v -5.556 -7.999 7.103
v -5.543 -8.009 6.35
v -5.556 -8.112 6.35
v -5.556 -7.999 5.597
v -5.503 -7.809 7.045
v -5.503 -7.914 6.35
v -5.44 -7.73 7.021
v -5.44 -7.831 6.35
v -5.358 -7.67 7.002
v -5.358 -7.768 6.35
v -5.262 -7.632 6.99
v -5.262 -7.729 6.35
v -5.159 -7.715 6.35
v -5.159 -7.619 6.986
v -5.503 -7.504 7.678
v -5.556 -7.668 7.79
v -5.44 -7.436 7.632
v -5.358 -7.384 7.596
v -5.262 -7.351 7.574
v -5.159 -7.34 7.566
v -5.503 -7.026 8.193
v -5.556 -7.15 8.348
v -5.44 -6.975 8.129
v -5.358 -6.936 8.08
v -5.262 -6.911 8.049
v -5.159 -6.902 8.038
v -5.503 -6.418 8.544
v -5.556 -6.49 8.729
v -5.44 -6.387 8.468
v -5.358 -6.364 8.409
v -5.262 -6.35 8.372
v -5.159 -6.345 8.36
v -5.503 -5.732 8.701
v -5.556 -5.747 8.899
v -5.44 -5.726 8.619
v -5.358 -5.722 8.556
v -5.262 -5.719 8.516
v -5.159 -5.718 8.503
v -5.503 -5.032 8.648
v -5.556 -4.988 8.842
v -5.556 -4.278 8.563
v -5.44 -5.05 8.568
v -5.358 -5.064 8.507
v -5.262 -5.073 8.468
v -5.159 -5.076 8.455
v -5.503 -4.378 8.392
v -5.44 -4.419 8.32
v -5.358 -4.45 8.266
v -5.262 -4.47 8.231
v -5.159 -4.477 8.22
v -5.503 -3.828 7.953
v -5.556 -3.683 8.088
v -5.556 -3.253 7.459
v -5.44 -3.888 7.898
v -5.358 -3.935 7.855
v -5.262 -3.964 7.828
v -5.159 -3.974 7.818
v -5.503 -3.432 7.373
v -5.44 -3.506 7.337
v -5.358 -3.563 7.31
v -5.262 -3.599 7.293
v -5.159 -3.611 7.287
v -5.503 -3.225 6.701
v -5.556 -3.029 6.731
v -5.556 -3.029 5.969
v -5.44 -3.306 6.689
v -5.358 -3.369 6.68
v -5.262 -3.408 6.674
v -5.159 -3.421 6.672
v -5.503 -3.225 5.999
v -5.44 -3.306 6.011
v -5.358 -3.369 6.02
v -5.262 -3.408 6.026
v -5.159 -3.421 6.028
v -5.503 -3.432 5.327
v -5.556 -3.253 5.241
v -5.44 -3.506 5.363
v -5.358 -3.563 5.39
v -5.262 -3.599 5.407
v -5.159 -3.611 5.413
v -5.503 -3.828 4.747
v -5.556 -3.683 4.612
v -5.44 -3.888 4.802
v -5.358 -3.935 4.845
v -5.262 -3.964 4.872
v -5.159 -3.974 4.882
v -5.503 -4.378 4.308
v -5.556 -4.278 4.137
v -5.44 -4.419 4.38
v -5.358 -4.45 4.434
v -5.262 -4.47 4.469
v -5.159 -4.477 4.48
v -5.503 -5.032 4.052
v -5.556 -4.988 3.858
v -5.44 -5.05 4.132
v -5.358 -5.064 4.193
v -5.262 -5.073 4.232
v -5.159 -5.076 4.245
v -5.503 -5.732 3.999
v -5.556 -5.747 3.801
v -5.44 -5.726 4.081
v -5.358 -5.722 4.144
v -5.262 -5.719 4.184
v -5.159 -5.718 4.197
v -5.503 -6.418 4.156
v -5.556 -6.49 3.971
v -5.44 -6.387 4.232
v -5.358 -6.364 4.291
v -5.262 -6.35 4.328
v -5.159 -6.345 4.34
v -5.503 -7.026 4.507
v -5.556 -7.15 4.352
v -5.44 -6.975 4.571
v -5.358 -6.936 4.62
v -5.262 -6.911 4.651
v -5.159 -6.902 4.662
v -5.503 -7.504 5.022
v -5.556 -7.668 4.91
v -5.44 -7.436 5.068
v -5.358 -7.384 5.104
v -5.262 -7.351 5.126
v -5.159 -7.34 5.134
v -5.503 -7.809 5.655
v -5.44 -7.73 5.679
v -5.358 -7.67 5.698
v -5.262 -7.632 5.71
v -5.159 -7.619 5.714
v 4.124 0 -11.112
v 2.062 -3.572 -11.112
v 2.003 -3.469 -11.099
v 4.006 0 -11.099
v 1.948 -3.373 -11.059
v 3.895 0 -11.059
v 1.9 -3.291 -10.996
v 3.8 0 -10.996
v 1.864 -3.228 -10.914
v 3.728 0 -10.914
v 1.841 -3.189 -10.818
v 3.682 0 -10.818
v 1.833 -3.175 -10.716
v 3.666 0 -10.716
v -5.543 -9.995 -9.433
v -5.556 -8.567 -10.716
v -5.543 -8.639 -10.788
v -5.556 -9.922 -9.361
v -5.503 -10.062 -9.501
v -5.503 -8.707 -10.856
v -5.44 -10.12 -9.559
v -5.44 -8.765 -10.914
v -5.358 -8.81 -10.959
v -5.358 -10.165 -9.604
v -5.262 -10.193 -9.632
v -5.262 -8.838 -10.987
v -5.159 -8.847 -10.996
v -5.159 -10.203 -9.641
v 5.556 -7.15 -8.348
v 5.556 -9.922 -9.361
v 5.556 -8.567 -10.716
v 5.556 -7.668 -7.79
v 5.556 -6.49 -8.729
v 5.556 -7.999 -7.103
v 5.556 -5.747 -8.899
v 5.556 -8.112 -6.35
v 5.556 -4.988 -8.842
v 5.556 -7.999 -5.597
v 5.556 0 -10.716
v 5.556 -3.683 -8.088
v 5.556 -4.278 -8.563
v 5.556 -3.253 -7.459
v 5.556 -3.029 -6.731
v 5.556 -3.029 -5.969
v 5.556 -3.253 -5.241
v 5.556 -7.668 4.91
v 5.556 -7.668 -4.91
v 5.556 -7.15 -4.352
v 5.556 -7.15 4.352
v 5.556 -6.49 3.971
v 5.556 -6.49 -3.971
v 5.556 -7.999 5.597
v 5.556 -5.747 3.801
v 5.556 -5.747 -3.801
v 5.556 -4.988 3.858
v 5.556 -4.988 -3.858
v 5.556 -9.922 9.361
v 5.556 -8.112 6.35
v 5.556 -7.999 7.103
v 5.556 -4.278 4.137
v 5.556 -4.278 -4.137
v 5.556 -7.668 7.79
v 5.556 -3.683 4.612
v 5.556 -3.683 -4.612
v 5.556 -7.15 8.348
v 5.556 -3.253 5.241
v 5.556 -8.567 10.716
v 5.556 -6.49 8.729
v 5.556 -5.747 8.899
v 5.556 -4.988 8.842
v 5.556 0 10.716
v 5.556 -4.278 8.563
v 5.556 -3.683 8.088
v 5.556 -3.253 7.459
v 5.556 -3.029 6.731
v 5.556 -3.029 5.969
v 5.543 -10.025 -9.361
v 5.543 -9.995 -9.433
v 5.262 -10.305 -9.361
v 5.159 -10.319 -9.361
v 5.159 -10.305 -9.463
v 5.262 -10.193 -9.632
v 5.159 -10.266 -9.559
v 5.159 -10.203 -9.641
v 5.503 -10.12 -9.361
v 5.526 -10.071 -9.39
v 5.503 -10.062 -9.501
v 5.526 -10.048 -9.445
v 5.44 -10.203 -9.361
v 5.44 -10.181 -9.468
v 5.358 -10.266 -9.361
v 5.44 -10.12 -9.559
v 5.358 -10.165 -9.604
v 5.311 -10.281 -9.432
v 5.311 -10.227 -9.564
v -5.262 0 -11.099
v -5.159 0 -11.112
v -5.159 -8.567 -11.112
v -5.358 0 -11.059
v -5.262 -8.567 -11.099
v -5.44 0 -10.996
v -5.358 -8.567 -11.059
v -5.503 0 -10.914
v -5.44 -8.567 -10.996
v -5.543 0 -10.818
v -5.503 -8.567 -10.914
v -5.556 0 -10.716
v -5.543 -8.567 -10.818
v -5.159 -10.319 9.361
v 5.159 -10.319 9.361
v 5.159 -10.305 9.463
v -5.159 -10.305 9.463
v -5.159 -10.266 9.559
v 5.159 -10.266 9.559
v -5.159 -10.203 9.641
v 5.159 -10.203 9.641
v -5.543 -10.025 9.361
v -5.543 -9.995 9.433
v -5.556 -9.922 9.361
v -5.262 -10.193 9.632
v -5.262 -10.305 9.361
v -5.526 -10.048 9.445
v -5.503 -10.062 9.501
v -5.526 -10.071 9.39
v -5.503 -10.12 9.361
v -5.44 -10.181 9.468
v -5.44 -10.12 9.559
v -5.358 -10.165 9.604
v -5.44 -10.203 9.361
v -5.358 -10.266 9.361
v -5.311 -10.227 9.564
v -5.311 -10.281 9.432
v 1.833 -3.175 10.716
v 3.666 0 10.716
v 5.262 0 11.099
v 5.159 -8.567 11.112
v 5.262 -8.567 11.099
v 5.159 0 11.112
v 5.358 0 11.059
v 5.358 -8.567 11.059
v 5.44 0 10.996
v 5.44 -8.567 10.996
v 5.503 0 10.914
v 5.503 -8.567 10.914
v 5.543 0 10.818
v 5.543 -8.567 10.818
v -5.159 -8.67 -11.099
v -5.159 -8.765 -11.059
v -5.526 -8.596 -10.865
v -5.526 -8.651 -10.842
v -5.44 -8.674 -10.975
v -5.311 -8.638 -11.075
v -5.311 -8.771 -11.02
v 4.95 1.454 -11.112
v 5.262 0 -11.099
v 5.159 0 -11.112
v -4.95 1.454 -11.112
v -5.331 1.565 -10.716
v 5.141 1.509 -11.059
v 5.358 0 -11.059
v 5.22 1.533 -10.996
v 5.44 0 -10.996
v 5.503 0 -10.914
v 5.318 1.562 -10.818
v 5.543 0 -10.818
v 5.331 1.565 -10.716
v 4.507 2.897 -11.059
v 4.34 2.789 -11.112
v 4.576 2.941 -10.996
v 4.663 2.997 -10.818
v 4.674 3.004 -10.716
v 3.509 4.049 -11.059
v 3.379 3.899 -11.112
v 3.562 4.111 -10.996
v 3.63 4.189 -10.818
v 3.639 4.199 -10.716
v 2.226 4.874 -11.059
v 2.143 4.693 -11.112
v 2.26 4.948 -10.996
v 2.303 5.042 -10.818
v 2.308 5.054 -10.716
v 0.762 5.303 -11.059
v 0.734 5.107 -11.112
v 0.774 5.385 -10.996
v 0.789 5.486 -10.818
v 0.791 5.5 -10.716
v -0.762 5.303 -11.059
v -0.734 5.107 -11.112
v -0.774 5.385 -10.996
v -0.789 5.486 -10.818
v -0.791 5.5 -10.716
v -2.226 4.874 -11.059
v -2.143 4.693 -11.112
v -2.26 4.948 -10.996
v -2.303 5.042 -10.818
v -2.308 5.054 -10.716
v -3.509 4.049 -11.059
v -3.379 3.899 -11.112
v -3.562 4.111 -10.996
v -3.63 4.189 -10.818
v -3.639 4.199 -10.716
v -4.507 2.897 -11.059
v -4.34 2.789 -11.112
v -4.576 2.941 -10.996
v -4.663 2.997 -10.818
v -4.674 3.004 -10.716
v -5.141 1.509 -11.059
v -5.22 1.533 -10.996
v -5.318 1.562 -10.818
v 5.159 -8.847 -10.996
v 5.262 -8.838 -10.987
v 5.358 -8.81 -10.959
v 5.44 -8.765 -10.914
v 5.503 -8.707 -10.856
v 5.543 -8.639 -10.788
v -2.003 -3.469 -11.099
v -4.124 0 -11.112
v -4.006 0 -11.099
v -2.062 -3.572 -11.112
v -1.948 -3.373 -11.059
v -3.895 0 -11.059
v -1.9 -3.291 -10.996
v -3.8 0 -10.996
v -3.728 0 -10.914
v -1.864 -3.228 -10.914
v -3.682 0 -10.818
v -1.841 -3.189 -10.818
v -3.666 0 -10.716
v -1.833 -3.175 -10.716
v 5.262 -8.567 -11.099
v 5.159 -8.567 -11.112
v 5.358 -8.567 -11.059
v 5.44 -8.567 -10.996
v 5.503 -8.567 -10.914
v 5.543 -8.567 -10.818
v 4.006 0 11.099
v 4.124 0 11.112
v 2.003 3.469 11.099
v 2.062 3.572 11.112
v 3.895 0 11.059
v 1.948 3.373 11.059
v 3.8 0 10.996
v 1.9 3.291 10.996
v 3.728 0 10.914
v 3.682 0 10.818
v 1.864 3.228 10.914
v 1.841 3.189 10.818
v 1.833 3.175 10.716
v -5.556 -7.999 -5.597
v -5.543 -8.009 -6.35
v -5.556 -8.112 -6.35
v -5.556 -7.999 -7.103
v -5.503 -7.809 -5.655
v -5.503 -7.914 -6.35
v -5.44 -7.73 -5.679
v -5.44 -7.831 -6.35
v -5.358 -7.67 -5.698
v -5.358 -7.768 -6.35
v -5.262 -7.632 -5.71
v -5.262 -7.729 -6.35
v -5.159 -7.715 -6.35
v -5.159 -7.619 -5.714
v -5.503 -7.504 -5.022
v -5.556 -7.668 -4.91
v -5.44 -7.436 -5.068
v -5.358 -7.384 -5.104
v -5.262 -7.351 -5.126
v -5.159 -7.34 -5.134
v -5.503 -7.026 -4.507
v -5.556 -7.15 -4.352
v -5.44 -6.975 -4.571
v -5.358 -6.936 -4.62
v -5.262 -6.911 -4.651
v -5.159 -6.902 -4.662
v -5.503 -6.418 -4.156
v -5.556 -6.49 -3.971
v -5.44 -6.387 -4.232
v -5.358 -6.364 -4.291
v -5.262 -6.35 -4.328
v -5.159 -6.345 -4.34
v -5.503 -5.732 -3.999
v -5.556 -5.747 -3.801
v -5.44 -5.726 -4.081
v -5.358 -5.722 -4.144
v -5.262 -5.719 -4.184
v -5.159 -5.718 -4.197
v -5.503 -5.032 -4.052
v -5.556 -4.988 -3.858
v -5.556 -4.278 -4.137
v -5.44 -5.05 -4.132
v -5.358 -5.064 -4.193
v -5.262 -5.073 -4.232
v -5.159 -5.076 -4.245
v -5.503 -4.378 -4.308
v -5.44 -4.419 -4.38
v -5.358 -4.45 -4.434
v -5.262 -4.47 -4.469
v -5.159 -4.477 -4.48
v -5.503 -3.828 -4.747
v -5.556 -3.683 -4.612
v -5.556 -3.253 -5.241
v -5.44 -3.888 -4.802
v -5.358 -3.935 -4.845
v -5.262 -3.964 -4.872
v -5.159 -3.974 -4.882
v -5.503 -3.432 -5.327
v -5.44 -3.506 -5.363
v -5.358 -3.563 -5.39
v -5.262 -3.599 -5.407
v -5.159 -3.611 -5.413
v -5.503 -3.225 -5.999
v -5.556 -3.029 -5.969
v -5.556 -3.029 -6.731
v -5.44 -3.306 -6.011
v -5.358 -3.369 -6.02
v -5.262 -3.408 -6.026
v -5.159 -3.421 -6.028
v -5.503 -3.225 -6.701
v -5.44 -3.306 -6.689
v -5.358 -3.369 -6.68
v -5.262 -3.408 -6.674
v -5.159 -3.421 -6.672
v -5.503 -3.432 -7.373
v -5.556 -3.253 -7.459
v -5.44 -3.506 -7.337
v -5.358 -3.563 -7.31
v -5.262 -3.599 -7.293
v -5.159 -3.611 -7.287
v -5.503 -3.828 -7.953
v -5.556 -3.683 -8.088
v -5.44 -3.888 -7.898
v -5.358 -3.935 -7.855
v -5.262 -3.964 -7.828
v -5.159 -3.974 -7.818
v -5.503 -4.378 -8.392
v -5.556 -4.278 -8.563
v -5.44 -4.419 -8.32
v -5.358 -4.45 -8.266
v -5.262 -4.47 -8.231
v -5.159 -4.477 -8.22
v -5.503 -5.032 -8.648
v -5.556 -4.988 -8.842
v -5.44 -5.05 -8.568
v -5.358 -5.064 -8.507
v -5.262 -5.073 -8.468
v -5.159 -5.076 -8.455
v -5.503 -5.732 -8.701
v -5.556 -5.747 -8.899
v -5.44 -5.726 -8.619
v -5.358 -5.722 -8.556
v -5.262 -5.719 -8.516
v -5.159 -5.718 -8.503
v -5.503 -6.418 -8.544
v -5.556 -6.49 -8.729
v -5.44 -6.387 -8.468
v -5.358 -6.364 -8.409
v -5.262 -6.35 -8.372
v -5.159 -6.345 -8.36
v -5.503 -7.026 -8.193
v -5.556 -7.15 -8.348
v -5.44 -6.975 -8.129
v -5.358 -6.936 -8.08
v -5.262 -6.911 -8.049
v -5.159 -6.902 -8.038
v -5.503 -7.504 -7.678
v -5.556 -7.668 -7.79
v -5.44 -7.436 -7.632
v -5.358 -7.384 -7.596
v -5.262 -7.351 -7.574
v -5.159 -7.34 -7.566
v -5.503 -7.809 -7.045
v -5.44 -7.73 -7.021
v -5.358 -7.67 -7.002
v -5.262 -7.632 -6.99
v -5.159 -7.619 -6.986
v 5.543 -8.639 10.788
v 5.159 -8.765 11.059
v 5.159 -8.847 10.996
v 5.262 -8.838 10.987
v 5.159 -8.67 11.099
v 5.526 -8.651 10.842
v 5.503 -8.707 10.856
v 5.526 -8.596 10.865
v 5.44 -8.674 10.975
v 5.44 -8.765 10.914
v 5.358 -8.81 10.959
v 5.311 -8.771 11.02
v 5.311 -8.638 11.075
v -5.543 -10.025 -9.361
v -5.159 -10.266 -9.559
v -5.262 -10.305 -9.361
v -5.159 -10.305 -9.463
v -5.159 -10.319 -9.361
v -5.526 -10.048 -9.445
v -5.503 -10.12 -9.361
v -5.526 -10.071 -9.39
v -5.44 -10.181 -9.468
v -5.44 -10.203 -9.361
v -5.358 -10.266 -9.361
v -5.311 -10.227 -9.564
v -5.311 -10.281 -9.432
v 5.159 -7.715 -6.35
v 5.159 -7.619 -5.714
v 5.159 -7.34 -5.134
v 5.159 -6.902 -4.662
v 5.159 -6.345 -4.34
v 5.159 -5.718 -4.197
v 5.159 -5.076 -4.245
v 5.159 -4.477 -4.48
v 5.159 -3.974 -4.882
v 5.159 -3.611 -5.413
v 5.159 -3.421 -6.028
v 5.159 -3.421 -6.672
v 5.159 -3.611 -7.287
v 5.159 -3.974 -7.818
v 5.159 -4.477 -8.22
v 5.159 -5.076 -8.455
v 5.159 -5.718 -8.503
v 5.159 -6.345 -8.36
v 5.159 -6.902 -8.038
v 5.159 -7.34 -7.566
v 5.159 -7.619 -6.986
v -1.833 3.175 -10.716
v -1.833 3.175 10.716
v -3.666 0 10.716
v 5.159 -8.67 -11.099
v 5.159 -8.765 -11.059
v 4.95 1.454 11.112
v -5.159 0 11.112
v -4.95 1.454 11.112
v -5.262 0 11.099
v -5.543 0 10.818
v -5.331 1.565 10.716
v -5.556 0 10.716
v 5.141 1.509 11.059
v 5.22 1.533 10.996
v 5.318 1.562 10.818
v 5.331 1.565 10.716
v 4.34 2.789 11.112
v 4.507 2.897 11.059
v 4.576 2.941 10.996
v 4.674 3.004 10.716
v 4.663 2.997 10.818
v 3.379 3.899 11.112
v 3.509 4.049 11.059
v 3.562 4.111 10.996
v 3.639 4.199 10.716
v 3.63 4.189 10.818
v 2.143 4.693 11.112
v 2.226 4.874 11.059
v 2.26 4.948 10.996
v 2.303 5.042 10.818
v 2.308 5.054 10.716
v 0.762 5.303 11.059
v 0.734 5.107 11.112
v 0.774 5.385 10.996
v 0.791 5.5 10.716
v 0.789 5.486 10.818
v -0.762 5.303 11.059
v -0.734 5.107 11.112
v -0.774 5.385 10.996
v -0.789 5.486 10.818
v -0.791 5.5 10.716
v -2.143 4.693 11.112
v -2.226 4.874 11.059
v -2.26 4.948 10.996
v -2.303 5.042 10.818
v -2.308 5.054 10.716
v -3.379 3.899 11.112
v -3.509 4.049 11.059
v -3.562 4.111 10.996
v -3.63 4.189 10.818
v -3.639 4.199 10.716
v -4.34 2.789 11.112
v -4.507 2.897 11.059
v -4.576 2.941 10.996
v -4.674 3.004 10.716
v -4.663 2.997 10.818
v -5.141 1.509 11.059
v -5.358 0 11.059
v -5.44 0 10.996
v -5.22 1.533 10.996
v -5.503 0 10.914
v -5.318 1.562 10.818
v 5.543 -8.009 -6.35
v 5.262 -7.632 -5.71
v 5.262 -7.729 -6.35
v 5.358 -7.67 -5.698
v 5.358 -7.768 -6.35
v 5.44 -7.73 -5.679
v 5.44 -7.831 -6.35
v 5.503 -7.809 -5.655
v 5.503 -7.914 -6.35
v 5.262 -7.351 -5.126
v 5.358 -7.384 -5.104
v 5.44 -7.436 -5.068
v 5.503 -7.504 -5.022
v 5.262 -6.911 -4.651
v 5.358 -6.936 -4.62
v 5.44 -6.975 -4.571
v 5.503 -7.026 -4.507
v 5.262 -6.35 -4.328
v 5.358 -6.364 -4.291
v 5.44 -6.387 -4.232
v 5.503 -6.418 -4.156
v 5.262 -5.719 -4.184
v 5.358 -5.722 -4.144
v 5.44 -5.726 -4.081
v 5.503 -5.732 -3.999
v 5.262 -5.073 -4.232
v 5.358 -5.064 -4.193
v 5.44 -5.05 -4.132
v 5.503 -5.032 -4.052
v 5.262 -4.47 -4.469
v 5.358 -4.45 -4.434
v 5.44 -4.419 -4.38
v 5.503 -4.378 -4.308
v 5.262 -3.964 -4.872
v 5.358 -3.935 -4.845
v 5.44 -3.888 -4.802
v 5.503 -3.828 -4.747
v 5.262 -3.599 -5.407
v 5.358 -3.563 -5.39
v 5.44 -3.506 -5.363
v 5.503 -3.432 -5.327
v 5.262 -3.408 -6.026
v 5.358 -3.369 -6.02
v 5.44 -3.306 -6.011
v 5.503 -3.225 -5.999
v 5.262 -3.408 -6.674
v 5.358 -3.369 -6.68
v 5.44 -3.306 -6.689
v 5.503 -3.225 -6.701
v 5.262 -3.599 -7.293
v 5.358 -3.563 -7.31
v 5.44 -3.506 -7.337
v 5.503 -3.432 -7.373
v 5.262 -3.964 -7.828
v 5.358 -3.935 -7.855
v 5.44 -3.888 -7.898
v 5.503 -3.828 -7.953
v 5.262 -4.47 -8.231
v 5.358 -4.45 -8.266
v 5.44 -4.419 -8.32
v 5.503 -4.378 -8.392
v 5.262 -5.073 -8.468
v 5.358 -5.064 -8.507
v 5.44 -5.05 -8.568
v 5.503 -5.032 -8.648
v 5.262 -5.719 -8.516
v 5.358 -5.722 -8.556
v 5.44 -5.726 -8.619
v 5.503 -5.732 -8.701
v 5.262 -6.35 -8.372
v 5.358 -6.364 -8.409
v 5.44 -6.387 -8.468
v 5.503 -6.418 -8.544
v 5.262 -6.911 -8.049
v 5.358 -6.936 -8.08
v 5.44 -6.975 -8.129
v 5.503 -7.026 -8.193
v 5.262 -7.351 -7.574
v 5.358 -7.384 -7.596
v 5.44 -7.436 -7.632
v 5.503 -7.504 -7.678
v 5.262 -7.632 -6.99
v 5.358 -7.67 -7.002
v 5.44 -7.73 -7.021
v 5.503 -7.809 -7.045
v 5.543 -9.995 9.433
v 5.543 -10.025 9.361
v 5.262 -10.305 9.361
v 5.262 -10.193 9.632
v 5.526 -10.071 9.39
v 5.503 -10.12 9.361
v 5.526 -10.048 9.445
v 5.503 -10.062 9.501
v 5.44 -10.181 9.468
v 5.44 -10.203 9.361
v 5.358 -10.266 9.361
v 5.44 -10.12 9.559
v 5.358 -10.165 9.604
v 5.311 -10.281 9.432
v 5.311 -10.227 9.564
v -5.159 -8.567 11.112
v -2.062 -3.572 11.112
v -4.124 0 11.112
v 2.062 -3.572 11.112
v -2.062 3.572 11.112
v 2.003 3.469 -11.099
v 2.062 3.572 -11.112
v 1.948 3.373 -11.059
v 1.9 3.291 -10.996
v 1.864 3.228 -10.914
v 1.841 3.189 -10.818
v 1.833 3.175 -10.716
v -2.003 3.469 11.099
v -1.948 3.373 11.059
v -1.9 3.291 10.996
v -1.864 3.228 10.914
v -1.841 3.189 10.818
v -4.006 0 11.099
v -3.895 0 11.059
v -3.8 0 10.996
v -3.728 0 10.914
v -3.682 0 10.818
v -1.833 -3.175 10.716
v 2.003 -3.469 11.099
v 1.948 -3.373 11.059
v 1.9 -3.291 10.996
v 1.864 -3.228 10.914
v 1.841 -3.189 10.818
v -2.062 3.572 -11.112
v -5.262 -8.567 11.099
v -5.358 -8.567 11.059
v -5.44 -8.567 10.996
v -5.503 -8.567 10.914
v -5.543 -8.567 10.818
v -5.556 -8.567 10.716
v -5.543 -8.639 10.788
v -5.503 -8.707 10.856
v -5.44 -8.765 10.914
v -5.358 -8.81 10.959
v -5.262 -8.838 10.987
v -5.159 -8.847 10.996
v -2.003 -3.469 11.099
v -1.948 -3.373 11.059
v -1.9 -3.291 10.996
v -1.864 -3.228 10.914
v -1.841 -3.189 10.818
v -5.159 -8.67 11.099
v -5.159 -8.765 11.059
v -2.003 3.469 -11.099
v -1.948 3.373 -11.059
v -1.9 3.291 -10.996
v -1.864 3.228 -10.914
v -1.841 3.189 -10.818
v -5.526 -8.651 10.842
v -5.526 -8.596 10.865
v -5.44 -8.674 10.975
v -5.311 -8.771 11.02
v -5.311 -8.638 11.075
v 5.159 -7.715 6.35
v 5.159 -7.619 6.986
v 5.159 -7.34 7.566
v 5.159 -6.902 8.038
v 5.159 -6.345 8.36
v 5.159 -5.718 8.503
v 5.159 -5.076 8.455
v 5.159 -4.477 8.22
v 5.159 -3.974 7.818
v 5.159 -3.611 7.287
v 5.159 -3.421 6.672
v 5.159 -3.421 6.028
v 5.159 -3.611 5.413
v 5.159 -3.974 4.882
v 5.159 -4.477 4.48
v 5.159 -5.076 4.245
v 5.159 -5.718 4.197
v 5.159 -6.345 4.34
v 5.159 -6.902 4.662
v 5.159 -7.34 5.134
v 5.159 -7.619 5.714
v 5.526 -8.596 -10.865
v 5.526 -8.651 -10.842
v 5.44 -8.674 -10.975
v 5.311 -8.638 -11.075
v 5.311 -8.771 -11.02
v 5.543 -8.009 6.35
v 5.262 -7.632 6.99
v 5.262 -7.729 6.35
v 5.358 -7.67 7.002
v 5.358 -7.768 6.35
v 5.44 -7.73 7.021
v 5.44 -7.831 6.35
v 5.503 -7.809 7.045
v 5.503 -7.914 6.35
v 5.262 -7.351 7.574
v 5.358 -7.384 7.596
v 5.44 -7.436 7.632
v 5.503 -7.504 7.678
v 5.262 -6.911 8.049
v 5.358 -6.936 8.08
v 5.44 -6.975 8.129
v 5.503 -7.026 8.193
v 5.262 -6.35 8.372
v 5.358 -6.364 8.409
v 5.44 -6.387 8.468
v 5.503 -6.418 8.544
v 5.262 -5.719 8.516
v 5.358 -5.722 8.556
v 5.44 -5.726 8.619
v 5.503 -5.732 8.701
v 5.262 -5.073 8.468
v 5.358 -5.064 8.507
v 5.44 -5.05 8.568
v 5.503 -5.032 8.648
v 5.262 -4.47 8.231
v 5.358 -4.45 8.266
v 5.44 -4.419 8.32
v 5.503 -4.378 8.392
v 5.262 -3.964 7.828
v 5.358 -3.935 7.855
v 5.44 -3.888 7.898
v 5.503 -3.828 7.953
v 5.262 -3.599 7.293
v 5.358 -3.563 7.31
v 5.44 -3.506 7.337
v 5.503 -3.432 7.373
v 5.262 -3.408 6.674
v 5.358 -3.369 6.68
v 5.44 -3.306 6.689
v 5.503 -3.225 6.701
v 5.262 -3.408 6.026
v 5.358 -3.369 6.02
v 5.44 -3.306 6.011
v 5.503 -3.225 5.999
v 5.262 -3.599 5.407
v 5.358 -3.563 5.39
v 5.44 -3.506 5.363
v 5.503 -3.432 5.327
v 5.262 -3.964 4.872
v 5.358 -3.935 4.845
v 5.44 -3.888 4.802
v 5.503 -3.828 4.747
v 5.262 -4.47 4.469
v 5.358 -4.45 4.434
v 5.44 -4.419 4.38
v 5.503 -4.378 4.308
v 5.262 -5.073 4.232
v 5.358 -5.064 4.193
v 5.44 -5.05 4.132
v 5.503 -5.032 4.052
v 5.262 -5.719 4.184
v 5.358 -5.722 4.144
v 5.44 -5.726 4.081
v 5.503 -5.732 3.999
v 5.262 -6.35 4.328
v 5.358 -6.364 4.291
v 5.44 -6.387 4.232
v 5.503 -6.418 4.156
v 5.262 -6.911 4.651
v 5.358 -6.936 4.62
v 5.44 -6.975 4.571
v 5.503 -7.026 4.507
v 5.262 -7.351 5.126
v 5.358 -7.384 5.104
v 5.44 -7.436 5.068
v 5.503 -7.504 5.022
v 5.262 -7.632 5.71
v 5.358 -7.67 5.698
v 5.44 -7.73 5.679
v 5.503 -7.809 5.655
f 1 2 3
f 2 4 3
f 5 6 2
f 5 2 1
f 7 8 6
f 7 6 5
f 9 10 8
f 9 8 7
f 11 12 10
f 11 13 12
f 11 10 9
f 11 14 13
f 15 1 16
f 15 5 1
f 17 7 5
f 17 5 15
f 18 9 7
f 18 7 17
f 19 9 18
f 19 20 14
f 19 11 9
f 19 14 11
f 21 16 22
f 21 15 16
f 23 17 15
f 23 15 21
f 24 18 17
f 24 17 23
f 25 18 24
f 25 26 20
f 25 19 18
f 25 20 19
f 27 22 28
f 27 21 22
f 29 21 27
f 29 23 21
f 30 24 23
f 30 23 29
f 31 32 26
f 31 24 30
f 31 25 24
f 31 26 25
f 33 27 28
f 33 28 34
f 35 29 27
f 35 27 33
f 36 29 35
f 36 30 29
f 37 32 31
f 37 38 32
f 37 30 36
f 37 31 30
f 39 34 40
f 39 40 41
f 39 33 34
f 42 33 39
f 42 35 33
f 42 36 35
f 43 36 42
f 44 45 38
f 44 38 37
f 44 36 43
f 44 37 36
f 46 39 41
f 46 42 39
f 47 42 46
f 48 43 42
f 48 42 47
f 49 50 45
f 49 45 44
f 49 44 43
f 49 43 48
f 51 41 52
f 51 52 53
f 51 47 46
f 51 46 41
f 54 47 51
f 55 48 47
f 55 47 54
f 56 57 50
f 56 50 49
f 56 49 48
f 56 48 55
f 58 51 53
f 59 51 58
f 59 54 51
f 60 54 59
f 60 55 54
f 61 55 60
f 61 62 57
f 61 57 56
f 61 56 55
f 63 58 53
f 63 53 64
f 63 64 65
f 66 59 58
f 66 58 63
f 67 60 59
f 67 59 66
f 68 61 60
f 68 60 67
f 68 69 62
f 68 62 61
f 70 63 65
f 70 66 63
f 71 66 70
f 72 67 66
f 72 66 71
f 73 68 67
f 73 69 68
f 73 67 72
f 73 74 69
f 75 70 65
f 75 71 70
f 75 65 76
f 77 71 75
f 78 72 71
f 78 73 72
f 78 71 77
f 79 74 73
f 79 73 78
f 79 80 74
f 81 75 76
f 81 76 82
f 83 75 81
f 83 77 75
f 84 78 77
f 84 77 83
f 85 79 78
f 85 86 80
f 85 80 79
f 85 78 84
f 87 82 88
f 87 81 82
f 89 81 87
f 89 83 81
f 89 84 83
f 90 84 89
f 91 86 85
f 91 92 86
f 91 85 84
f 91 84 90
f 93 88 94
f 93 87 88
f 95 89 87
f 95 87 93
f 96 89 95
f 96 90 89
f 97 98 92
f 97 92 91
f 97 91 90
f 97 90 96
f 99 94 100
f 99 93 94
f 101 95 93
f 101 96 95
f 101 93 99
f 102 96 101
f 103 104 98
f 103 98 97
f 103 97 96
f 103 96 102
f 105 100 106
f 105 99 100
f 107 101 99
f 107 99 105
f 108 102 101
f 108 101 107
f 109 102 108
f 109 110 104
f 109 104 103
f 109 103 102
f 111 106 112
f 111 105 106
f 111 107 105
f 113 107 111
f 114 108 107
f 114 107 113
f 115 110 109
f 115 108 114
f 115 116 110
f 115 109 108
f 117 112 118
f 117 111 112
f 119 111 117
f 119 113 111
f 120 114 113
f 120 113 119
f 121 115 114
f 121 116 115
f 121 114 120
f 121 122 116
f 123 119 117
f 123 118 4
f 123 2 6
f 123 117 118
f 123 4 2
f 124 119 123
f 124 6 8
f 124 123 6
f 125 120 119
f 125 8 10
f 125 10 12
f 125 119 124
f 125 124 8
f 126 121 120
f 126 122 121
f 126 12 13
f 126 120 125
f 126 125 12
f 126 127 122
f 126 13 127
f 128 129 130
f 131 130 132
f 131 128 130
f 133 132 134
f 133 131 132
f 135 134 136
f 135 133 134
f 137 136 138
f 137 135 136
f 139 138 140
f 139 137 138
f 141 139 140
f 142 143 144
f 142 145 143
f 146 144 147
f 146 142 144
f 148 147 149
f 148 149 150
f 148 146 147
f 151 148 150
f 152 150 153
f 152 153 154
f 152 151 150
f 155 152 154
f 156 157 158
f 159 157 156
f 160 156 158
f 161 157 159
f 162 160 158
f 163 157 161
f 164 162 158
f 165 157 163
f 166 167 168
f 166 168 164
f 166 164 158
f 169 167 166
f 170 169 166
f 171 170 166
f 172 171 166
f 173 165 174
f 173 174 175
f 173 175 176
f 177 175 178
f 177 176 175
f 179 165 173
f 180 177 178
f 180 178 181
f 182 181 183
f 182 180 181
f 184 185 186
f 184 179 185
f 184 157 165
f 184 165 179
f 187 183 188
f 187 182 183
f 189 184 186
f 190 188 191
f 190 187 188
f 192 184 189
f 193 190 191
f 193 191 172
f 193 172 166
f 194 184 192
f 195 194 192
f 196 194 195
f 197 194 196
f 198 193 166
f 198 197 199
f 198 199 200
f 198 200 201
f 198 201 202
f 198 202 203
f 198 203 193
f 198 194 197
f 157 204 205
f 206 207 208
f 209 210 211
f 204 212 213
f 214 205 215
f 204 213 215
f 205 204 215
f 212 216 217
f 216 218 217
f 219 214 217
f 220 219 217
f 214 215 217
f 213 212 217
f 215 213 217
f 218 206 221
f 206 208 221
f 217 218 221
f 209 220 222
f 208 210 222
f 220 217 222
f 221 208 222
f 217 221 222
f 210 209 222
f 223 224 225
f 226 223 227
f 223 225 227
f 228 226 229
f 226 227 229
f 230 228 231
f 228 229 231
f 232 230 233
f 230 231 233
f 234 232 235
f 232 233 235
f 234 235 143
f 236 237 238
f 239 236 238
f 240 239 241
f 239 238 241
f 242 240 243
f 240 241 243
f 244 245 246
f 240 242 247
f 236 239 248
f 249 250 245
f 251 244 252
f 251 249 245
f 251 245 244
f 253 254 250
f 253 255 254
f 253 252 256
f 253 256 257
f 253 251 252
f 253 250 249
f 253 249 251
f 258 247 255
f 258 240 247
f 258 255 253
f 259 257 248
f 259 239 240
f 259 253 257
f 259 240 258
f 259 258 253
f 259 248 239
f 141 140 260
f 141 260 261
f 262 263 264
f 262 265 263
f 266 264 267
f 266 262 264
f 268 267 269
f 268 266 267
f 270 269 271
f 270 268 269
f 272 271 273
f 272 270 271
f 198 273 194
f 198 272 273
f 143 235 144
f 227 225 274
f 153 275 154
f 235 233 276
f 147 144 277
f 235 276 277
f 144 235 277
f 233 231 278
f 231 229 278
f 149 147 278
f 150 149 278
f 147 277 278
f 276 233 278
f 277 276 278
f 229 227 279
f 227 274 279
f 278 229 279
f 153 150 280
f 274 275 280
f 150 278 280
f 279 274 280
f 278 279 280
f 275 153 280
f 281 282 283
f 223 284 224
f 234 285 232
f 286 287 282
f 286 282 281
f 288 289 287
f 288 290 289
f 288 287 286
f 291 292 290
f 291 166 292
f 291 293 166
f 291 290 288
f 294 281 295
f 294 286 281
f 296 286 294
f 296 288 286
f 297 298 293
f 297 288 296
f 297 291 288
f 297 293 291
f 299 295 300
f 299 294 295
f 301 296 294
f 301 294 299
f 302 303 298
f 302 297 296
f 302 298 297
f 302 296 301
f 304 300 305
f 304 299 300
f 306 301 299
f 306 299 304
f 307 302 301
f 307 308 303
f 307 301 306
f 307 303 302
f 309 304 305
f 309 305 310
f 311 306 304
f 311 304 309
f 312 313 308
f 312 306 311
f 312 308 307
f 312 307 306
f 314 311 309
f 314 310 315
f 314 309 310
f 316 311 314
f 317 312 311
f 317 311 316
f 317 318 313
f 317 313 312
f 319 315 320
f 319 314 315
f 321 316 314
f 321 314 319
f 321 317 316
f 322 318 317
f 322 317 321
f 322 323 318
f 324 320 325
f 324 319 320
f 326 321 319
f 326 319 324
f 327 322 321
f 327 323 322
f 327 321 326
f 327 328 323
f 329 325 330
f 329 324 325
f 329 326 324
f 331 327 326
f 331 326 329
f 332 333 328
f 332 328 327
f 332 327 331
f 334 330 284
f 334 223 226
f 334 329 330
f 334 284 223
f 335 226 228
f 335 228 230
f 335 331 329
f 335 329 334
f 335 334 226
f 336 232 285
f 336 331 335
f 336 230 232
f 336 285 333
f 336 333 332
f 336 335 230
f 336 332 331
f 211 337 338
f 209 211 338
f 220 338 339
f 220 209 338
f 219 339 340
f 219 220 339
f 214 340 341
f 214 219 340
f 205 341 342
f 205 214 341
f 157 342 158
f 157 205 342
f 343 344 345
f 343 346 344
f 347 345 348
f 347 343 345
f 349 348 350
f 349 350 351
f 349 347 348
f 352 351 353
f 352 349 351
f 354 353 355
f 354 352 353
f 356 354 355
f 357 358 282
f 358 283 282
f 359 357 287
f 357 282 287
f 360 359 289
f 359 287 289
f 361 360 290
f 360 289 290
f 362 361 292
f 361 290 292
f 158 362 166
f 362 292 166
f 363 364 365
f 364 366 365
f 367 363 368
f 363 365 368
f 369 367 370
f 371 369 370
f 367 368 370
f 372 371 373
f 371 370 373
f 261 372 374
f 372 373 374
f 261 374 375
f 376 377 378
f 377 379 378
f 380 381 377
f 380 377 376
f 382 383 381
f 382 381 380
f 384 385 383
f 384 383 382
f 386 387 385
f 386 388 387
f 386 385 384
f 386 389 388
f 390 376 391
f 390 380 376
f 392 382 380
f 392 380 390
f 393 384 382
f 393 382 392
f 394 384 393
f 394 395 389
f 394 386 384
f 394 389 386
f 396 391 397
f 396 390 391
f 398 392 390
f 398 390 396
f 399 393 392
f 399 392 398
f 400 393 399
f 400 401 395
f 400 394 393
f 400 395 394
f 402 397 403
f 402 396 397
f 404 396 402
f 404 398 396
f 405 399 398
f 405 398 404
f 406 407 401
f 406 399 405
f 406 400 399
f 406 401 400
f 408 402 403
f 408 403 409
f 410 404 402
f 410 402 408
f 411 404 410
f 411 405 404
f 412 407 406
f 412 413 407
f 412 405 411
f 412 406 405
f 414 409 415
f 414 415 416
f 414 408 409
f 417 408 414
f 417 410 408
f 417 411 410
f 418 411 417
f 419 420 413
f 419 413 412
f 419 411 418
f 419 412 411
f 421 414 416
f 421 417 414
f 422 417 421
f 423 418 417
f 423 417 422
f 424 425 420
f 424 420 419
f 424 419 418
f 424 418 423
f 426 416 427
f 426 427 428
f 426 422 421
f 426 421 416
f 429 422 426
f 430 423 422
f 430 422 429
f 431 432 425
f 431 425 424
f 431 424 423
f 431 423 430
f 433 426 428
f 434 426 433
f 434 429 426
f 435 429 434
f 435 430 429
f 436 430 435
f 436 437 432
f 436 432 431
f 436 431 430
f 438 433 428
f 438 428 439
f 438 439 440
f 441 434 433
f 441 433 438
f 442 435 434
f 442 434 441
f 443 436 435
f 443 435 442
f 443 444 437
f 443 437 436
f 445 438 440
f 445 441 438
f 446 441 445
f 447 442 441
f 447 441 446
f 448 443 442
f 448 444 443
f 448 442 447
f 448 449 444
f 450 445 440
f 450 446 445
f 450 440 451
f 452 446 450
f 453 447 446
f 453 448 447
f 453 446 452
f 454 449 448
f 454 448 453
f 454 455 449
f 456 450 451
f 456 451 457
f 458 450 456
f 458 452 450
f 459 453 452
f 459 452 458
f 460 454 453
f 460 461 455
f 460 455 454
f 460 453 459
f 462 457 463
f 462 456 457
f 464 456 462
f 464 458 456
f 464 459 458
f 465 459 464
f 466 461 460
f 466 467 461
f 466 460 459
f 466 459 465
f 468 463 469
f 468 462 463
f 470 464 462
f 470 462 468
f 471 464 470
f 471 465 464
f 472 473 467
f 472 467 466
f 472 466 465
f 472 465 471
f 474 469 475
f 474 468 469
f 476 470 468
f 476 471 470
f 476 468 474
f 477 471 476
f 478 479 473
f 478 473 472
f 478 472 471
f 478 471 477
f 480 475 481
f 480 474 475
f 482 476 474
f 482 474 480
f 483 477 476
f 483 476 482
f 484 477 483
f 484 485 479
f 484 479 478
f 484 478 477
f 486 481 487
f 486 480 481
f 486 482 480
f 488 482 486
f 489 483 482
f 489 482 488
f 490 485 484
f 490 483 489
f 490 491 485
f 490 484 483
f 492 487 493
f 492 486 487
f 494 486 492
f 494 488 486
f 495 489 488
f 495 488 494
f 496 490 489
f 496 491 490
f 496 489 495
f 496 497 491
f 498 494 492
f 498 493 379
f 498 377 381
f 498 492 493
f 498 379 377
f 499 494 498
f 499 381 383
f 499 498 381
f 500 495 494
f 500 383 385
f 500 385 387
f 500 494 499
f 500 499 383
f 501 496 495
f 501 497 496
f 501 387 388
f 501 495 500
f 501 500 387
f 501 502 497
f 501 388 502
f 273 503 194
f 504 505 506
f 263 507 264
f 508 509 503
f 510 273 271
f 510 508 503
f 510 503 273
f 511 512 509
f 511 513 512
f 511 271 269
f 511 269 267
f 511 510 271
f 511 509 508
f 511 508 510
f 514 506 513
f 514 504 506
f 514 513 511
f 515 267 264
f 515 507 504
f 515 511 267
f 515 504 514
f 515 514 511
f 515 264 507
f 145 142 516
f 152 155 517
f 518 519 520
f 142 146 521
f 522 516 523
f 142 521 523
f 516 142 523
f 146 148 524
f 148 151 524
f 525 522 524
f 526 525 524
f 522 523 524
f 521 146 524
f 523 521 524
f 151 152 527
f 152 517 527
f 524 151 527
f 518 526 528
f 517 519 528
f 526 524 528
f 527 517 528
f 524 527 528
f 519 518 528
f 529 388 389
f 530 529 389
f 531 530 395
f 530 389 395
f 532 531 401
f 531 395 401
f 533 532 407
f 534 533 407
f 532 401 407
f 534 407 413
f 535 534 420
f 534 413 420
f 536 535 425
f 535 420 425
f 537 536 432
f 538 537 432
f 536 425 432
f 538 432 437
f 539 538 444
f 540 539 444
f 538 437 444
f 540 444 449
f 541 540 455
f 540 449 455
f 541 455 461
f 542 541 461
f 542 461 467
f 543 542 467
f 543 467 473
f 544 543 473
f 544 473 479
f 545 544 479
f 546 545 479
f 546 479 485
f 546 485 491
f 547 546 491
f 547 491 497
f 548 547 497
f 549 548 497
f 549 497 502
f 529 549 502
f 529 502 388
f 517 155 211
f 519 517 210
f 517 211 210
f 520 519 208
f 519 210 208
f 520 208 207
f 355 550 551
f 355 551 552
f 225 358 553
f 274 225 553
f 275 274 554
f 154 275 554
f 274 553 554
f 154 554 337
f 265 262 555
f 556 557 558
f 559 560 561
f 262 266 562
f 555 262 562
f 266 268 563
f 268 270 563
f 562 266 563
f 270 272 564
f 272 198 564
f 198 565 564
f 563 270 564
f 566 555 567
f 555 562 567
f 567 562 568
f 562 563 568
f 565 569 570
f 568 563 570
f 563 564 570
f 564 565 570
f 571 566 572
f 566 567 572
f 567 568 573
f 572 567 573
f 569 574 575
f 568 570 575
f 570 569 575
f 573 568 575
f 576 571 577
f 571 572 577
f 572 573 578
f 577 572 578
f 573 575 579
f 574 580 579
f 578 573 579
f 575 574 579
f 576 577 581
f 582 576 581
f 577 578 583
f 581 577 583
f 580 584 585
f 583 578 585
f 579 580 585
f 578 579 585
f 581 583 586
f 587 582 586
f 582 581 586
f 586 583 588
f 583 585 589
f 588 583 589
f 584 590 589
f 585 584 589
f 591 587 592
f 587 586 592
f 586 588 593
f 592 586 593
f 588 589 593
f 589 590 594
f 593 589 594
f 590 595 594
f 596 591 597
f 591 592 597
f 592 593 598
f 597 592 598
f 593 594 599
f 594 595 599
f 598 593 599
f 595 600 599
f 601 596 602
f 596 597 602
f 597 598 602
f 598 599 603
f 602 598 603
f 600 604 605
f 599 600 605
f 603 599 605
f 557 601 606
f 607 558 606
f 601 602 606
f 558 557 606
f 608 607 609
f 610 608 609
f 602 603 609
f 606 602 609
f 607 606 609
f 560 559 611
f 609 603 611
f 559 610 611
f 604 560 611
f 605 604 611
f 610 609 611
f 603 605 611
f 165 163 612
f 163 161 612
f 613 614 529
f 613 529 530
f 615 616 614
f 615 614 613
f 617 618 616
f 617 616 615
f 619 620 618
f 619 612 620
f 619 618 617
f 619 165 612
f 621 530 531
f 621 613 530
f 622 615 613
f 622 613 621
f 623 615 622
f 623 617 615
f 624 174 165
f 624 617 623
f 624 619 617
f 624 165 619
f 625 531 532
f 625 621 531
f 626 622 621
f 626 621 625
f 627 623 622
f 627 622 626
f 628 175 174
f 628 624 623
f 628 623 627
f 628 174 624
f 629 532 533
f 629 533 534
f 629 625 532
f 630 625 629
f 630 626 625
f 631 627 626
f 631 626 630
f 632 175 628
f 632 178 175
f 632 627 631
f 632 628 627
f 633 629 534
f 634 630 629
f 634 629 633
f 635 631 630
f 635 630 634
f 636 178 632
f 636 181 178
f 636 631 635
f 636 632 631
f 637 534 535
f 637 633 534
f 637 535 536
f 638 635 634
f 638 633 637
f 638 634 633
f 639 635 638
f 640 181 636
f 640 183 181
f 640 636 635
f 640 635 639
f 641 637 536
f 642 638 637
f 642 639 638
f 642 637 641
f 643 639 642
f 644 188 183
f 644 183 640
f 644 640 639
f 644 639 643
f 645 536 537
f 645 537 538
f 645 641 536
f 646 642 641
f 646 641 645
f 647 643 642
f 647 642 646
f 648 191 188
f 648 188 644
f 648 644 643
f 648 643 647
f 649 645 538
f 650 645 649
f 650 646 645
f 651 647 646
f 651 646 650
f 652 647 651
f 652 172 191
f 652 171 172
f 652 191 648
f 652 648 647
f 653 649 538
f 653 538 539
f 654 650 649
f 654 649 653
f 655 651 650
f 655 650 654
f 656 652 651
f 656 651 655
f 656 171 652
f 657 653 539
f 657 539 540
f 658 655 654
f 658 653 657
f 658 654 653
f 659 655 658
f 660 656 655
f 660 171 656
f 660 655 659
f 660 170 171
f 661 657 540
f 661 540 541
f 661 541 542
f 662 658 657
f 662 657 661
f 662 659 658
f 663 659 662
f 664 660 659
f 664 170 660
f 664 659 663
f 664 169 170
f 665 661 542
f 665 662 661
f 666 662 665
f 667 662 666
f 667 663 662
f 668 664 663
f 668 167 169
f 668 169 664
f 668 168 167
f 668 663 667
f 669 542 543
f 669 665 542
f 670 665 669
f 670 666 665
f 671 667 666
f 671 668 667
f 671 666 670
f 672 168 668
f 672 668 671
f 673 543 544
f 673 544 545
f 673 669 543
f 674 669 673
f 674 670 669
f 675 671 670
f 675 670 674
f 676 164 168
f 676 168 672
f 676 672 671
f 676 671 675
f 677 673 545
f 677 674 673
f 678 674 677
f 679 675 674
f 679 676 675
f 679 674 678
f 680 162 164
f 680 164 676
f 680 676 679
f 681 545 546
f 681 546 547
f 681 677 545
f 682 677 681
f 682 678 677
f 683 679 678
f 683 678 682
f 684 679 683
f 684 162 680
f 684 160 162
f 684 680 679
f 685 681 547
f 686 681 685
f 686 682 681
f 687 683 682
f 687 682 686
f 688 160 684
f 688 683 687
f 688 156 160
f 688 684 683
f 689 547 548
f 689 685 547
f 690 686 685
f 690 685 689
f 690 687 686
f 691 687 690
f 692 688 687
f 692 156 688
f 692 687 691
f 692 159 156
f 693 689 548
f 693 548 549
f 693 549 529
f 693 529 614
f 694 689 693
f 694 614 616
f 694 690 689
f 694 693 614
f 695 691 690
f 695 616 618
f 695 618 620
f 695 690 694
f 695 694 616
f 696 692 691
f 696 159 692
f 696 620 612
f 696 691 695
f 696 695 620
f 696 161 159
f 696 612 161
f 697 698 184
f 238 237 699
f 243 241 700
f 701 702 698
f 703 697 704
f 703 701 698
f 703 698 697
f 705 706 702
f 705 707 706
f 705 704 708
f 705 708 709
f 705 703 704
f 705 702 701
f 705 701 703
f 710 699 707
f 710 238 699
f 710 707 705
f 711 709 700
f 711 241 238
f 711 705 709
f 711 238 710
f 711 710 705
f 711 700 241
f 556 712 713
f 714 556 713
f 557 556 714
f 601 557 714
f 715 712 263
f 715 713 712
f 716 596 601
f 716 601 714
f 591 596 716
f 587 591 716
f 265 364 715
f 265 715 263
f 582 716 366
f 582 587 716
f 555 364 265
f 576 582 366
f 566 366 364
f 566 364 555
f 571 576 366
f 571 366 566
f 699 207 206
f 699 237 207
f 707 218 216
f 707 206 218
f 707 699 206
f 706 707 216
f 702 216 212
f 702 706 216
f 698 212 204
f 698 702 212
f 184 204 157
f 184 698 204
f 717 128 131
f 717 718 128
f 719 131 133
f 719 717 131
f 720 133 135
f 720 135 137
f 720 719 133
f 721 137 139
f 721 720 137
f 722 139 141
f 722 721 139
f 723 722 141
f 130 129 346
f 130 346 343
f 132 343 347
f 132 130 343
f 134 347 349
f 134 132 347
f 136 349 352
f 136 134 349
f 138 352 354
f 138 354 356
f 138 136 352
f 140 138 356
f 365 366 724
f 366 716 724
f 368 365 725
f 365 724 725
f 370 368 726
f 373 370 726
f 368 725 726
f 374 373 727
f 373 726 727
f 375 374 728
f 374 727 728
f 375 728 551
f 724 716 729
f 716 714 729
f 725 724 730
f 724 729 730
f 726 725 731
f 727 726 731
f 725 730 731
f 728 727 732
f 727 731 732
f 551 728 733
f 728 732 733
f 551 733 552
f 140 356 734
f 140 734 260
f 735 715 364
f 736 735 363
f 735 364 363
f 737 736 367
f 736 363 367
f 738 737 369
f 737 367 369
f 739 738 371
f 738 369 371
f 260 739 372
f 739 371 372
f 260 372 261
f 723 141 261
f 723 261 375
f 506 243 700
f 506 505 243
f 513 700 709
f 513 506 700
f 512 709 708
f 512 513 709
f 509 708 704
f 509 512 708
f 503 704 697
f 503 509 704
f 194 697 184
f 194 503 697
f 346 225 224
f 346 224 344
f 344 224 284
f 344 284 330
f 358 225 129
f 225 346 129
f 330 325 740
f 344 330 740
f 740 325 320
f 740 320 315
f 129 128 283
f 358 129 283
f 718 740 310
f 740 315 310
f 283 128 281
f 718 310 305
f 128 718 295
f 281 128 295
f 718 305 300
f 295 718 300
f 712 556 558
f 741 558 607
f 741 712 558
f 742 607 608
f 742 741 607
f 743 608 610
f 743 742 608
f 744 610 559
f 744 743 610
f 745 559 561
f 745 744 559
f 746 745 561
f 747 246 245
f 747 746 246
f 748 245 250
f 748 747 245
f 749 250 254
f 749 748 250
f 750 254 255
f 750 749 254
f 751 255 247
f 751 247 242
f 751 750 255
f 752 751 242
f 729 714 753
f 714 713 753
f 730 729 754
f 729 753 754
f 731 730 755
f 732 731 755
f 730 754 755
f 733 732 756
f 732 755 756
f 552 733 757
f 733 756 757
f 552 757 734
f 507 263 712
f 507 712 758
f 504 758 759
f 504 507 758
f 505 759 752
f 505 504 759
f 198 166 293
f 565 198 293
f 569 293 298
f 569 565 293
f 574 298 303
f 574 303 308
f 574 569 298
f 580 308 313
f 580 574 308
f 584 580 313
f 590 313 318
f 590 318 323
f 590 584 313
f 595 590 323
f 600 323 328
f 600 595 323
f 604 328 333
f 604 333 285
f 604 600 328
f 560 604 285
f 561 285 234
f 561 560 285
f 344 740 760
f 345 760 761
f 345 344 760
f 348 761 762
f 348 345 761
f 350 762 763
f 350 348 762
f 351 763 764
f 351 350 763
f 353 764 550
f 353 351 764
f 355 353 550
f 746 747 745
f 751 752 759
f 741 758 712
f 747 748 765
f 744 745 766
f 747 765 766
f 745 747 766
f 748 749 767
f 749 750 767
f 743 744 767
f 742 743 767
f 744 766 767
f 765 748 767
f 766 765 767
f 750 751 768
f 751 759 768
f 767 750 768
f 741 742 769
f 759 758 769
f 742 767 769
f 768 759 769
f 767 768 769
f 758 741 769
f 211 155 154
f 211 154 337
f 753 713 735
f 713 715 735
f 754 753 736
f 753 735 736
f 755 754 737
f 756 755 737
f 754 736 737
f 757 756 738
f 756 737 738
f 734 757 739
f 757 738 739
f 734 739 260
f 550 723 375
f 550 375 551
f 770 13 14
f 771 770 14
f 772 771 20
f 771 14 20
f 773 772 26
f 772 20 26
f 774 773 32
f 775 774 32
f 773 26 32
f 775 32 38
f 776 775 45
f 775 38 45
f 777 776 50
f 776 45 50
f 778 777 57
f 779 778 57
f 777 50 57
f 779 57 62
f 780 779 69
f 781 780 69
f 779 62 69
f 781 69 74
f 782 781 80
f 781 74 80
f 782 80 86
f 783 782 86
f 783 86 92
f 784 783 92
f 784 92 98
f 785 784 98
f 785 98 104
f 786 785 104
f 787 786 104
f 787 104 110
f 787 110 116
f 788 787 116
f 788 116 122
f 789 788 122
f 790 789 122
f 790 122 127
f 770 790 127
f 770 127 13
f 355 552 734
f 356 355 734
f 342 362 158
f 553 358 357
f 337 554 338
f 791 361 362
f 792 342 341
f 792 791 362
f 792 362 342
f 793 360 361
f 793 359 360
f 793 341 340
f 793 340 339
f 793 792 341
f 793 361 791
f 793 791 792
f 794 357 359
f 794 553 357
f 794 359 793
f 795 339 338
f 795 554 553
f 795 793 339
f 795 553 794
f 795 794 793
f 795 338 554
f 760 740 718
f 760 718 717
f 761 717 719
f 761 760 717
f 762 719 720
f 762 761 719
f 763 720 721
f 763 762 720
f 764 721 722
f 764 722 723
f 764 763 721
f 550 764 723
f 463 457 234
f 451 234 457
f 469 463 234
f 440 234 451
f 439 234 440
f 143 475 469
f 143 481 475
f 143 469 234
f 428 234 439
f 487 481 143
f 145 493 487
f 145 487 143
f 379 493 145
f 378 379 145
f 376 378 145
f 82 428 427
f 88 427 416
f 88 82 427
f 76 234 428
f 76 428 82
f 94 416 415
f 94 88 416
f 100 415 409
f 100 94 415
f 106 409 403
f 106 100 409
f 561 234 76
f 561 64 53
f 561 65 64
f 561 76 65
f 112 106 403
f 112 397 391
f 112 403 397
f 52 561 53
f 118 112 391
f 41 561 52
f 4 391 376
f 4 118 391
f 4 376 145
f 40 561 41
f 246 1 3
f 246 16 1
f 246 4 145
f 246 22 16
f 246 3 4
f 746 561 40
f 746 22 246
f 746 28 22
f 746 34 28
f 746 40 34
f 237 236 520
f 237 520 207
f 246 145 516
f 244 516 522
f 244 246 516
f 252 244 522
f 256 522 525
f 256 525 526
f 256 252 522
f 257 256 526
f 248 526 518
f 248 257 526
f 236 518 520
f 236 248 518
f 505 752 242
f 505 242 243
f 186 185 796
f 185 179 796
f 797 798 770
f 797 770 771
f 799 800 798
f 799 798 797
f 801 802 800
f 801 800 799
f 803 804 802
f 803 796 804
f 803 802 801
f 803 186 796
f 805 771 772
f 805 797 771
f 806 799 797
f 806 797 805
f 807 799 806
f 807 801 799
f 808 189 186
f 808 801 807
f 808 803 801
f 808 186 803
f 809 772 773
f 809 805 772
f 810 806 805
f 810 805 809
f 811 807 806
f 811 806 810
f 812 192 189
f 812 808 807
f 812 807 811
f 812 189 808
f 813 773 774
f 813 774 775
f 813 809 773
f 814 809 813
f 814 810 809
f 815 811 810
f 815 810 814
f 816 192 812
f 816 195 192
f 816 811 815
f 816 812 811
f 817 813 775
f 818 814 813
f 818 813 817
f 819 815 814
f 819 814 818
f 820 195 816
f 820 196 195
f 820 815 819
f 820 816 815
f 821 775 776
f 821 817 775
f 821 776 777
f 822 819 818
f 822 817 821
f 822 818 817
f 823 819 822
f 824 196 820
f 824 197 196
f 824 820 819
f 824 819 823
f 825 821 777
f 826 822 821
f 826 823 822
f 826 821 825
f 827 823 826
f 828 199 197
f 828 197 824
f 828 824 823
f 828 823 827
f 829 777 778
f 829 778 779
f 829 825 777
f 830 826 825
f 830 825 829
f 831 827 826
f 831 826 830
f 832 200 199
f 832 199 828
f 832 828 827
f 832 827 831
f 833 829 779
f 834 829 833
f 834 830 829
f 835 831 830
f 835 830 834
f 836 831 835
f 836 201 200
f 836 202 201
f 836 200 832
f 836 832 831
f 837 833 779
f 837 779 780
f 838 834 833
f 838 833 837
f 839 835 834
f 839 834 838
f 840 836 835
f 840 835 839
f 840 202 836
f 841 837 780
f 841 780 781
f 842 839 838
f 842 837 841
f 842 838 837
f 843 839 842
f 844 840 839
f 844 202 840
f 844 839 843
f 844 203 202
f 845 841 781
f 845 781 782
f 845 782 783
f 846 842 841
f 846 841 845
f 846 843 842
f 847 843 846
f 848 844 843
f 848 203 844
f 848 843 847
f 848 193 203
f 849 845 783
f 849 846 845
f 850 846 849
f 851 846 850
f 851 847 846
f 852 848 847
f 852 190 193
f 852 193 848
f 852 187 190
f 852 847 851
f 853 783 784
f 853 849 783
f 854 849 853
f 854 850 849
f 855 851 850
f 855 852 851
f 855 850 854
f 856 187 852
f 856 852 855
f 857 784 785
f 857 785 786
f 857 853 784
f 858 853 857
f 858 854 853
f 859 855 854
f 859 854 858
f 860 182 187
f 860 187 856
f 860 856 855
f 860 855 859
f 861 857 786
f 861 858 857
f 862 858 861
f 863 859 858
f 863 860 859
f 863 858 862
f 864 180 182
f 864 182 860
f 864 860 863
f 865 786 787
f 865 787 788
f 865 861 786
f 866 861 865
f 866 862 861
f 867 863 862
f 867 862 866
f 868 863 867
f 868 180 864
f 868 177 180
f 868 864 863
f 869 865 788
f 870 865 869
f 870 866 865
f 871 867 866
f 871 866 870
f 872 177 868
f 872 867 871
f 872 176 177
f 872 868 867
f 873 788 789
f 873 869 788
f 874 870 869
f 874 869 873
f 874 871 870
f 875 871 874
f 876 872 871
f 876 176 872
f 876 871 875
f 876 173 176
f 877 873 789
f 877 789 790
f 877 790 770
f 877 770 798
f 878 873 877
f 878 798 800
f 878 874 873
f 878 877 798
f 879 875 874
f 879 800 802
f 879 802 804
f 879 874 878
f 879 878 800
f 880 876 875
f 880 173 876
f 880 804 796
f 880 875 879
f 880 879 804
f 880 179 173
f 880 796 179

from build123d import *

# Parameters (mm, degrees)
BOSS_EXTRUDE1_DEPTH = 11.1125
SKETCH2_R           = 2.159
CUT_EXTRUDE1_DEPTH  = 19.800316861
CHAMFER2_SIZE       = 1.5875
FILLET2_R           = 0.396875


with BuildPart() as part:
    # Sketch1 → Boss-Extrude1 (new, symmetric)
    with BuildSketch(Plane.XY):
        with BuildLine():
            Line((-5.55625, 0), (-5.55625, -10.31875))
            Line((-5.55625, -10.31875), (5.55625, -10.31875))
            Line((5.55625, -10.31875), (5.55625, 0))
            ThreePointArc((5.55625, 0), (0, 5.55625), (-5.55625, 0))
        make_face()
        Polygon((3.666174209, 0), (1.833087105, 3.175), (-1.833087105, 3.175), (-3.666174209, 0), (-1.833087105, -3.175), (1.833087105, -3.175), align=None, mode=Mode.SUBTRACT)
    extrude(amount=BOSS_EXTRUDE1_DEPTH, both=True)

    # Sketch2 → Cut-Extrude1 (cut, through all)
    with BuildSketch(Plane.ZY.offset(5.55625)):
        with Locations(Location((-6.35, -5.55625, 0), (0, 0, 270))):
            Circle(SKETCH2_R)
        with Locations(Location((6.35, -5.55625, 0), (0, 0, 270))):
            Circle(SKETCH2_R)
    extrude(amount=-CUT_EXTRUDE1_DEPTH, mode=Mode.SUBTRACT)

    # Chamfer2
    chamfer2_edges = [part.edges().sort_by_distance(p)[0] for p in [
        (0, -10.31875, 11.1125),
        (0, -10.31875, -11.1125),
    ]]
    chamfer(chamfer2_edges, length=CHAMFER2_SIZE)

    # Fillet2
    fillet2_edges = [part.edges().sort_by_distance(p)[0] for p in [
        (2.749630657, -1.5875, -11.1125),
        (2.749630657, 1.5875, -11.1125),
        (0, 3.175, -11.1125),
        (-2.749630657, 1.5875, -11.1125),
        (-2.749630657, -1.5875, -11.1125),
        (0, -3.175, -11.1125),
        (2.749630657, -1.5875, 11.1125),
        (2.749630657, 1.5875, 11.1125),
        (0, 3.175, 11.1125),
        (-2.749630657, 1.5875, 11.1125),
        (-2.749630657, -1.5875, 11.1125),
        (0, -3.175, 11.1125),
        (5.55625, -3.39725, -6.35),
        (-5.55625, -3.39725, -6.35),
        (5.55625, -3.39725, 6.35),
        (-5.55625, -3.39725, 6.35),
        (5.55625, -4.365625, 11.1125),
        (0, -8.73125, 11.1125),
        (5.55625, -4.365625, -11.1125),
        (5.55625, -10.31875, 0),
        (5.55625, -9.525, -10.31875),
        (5.55625, -9.525, 10.31875),
        (-5.55625, -10.31875, 0),
        (0, -10.31875, -9.525),
        (0, -10.31875, 9.525),
        (0, 5.55625, 11.1125),
        (-5.55625, -9.525, -10.31875),
        (-5.55625, -9.525, 10.31875),
        (0, -8.73125, -11.1125),
        (-5.55625, -4.365625, -11.1125),
        (0, 5.55625, -11.1125),
        (-5.55625, -4.365625, 11.1125),
    ]]
    fillet(fillet2_edges, radius=FILLET2_R)


solid = part.part
